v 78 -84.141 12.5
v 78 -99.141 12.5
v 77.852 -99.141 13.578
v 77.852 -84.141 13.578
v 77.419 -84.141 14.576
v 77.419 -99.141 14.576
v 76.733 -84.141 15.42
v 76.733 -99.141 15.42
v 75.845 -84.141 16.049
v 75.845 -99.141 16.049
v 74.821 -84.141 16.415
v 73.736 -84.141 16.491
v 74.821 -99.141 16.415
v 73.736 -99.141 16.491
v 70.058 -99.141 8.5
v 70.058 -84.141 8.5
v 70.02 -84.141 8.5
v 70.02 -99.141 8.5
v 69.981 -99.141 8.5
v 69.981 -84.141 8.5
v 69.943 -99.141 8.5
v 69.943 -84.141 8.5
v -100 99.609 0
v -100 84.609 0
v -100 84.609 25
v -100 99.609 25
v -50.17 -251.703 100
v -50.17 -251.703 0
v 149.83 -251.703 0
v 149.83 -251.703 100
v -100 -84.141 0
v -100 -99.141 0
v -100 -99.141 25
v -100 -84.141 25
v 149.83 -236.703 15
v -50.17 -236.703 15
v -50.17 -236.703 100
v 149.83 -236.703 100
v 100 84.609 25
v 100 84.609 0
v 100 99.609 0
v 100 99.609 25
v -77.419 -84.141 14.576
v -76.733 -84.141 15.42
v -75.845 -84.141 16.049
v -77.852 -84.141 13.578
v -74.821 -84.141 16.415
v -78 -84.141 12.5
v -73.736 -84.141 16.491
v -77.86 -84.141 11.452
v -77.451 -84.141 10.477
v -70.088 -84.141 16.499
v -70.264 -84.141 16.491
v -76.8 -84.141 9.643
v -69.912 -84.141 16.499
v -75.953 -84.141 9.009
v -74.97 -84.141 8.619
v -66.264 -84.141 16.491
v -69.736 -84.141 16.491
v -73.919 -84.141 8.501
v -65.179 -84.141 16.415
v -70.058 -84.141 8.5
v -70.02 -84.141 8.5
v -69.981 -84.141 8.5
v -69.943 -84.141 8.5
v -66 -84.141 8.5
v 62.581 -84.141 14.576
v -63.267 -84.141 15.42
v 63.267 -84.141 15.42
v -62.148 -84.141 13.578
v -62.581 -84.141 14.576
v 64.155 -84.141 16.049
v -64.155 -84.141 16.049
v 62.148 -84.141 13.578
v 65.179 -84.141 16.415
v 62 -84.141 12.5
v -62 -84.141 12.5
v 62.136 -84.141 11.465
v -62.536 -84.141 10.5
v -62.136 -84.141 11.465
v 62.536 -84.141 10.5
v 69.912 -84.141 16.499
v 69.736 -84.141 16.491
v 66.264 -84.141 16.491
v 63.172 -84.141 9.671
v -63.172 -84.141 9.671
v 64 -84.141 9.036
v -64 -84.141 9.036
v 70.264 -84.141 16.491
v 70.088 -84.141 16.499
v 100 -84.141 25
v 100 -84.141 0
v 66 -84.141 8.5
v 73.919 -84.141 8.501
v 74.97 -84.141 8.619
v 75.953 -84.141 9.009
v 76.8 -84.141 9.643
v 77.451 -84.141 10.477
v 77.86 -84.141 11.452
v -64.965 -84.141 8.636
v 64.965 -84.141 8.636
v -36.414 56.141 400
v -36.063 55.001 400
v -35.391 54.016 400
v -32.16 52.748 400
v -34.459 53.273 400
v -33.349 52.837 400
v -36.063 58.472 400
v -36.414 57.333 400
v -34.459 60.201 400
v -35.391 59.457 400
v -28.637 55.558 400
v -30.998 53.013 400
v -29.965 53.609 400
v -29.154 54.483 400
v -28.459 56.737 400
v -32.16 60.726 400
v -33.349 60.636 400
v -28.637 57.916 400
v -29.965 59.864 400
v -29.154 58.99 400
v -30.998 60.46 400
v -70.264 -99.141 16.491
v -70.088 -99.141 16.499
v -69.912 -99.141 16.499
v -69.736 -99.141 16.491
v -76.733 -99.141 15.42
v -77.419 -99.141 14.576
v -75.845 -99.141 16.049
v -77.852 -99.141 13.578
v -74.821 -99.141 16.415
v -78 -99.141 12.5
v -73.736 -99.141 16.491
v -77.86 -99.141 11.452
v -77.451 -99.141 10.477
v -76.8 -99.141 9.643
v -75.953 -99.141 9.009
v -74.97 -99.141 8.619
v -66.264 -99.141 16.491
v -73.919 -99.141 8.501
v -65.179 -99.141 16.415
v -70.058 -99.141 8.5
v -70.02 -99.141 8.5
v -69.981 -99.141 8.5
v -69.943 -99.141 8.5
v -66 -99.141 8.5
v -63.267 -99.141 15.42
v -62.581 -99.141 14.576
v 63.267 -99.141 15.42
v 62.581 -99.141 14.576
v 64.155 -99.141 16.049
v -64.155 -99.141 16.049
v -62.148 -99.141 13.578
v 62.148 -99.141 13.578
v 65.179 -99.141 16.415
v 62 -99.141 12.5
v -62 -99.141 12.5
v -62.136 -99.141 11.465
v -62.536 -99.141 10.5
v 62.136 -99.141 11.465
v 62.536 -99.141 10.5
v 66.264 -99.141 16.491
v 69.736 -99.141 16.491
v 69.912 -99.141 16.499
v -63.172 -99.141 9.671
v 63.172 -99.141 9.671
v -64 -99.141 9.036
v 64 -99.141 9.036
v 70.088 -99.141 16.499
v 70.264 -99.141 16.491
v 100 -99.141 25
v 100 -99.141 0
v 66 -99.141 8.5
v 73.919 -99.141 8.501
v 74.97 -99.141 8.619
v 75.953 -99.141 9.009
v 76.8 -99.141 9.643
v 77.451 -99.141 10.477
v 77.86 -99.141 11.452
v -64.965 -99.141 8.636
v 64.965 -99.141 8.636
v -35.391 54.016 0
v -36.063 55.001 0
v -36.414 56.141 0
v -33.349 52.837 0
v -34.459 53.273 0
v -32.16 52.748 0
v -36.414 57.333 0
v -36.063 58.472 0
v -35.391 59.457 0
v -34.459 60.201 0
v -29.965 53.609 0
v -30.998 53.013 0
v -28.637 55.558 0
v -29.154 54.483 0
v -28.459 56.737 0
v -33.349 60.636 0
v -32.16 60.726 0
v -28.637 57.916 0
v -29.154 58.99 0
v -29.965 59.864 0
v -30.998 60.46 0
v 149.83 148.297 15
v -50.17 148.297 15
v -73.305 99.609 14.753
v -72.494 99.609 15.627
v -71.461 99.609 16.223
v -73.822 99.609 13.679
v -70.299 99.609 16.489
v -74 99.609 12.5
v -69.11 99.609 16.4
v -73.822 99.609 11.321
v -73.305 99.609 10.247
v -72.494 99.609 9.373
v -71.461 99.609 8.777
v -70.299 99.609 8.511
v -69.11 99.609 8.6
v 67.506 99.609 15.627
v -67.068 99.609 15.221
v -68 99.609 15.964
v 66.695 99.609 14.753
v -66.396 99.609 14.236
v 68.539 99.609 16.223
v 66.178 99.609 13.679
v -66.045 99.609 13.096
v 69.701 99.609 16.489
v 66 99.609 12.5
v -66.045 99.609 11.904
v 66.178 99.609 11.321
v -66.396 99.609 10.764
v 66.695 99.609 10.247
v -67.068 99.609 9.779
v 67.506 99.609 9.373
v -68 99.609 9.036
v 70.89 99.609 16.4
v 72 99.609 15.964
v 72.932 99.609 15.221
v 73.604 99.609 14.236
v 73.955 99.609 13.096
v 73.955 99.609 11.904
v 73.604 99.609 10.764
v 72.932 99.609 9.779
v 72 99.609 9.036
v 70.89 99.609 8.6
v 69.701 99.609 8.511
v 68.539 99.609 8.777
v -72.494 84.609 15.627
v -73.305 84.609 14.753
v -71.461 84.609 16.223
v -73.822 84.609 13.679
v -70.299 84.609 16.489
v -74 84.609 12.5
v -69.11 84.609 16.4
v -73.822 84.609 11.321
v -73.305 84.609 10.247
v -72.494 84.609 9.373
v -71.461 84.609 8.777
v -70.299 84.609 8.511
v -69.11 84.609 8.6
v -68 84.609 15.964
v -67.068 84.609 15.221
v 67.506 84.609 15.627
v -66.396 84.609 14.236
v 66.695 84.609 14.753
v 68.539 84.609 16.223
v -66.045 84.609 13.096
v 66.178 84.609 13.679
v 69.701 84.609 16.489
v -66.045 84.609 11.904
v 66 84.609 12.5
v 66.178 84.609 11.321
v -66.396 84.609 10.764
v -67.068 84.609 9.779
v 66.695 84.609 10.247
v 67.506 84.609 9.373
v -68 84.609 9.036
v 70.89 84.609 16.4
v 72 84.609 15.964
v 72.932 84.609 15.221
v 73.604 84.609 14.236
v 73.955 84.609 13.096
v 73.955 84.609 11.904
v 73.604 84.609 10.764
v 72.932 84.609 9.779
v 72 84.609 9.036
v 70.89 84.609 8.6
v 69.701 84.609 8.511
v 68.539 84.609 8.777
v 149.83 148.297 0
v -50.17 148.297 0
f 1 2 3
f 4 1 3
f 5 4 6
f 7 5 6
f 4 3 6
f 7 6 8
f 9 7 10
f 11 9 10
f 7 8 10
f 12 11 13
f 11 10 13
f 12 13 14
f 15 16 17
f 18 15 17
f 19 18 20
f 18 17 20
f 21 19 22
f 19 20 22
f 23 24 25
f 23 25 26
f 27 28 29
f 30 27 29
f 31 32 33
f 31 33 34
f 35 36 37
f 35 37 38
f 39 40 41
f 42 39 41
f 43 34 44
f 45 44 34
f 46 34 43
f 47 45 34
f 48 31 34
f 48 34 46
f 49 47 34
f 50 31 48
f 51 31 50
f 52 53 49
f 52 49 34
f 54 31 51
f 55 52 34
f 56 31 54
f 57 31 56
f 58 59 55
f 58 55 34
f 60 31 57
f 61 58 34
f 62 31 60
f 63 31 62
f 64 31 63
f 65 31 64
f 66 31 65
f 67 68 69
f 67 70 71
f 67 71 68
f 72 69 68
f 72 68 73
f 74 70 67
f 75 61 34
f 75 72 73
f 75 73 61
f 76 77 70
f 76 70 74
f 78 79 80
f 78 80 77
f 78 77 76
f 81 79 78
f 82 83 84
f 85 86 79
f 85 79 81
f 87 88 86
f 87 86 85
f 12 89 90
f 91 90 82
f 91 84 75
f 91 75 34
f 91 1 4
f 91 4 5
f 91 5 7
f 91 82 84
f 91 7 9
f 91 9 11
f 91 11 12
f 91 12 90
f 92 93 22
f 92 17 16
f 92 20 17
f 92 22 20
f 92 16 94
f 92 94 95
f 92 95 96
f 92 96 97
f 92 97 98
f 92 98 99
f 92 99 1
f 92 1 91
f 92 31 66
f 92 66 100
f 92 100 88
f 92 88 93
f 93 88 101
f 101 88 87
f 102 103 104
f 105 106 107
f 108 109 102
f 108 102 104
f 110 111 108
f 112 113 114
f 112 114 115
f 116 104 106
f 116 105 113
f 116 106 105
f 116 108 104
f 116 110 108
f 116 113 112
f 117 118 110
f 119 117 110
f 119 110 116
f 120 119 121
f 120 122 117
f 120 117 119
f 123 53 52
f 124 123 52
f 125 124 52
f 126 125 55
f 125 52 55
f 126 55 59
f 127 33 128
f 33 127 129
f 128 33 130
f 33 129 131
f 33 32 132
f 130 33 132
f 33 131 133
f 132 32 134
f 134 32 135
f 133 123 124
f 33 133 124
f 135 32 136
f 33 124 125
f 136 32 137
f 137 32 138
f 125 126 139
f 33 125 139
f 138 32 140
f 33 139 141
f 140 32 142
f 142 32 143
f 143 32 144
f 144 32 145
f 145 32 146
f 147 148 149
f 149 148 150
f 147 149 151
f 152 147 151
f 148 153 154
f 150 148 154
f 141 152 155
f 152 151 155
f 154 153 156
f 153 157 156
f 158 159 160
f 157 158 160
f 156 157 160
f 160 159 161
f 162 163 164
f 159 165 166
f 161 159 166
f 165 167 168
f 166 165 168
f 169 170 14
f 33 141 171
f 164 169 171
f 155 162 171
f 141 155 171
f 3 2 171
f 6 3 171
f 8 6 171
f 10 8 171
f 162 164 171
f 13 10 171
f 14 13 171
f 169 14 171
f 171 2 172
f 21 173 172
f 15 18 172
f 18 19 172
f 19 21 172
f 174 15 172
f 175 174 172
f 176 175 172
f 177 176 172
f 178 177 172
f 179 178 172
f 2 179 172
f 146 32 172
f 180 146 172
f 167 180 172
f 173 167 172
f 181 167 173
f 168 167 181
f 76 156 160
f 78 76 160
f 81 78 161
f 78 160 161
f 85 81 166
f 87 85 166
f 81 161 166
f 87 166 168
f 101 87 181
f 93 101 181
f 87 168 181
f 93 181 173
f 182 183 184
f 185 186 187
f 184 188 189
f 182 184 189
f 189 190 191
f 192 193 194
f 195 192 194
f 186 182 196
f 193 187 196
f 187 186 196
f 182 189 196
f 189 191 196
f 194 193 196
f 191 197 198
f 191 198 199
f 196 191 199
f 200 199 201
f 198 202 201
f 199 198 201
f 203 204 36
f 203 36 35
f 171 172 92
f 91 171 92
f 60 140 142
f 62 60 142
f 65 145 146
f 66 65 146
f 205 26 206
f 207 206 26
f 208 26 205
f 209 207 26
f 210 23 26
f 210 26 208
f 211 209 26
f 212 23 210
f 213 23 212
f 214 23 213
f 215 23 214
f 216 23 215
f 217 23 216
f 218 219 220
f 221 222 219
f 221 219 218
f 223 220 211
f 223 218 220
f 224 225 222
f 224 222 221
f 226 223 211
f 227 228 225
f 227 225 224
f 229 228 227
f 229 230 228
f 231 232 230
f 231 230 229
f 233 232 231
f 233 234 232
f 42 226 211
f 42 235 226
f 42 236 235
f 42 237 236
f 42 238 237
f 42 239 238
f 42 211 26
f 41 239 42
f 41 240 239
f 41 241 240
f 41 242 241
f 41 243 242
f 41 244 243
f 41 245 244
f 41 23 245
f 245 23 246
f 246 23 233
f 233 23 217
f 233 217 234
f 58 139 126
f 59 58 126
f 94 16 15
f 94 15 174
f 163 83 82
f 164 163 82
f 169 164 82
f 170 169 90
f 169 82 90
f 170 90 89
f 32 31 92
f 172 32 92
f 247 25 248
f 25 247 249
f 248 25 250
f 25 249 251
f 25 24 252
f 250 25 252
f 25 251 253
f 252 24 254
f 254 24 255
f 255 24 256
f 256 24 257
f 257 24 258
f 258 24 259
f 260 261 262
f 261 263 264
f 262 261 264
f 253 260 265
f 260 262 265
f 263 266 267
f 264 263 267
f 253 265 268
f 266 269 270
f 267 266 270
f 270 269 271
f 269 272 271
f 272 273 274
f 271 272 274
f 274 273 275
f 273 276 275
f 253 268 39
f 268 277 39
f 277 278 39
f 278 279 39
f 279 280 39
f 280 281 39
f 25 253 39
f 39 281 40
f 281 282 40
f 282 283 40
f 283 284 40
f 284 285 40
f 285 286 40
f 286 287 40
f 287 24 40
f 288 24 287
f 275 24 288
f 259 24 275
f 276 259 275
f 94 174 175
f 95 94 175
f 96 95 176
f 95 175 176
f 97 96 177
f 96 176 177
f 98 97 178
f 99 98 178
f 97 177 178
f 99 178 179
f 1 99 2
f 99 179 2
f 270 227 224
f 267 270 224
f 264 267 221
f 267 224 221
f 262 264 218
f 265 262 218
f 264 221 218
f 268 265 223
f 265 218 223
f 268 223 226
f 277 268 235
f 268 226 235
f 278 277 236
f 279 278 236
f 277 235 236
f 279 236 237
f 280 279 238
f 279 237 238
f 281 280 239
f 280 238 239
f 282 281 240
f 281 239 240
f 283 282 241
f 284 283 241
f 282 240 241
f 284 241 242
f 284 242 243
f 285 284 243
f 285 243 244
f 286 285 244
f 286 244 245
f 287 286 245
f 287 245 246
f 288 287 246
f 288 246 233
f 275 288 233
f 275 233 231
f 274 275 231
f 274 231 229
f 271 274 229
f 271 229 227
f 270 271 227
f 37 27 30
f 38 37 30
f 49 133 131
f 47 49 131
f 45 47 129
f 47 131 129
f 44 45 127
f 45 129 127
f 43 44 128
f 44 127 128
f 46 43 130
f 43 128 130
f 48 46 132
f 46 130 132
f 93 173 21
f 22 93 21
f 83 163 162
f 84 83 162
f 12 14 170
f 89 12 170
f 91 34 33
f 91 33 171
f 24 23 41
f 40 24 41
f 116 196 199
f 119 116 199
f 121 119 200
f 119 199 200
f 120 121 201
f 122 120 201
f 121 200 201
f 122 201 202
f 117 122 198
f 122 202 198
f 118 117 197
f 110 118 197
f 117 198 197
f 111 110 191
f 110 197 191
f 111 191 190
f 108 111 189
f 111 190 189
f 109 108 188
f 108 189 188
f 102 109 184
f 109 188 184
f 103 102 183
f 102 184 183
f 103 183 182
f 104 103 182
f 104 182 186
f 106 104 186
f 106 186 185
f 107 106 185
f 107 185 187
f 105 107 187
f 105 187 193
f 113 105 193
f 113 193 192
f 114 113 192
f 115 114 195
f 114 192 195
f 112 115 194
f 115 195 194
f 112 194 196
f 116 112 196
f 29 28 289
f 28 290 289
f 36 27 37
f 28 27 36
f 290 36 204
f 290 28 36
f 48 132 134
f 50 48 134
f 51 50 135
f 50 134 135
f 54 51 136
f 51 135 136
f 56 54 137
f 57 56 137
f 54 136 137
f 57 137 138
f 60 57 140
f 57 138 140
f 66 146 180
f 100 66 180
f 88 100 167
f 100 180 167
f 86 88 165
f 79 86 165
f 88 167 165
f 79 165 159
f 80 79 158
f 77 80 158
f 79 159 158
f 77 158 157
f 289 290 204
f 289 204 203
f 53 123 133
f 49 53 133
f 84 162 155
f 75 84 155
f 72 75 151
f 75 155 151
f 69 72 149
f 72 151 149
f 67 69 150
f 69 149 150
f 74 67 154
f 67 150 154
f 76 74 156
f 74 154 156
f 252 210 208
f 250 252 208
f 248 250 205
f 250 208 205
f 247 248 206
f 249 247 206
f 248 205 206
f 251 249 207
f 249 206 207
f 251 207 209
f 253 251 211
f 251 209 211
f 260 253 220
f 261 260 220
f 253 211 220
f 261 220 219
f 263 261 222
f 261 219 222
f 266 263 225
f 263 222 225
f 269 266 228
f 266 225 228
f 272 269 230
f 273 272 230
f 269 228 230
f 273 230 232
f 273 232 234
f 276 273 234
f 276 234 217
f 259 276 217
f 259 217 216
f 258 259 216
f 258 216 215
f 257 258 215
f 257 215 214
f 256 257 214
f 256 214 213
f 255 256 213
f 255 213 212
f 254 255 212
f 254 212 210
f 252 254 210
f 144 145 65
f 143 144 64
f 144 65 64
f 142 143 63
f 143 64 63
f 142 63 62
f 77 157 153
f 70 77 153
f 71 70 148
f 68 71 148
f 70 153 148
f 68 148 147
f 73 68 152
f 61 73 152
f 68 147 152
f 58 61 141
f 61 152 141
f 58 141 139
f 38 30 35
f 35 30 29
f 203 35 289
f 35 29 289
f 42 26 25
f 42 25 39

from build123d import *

# Parameters (mm, degrees)
F0_W      = 200
F0_H      = 15
F1_DEPTH  = 25
F2_R      = 4
F3_DEPTH  = 400
F4_R      = 4
F5_DEPTH  = 400
F7_DEPTH  = 25
F8_W      = 200
F8_H      = 400
F9_DEPTH  = 15
F12_DEPTH = 100


with BuildPart() as f1:
    # F0 (on Top) → F1 (new body)
    with BuildSketch(Plane.XY):
        with Locations((0, 92.1094161626)):
            Rectangle(F0_W, F0_H)
    extrude(amount=F1_DEPTH)


with BuildPart() as f1b:
    # F0 (on Top) → F1, piece 2 (new body)
    with BuildSketch(Plane.XY):
        with Locations((0, -91.6406753098)):
            Rectangle(F0_W, F0_H)
    extrude(amount=F1_DEPTH)


with BuildPart() as f3_tool:
    # F2 (on face) → F3 (new body)
    with BuildSketch(Plane(origin=(0, 99.6094161626, 0), x_dir=(-1, 0, 0), z_dir=(0, 1, 0))):
        with Locations((-70, 12.5)):
            Circle(F2_R)
        with Locations((70, 12.5)):
            Circle(F2_R)
    extrude(amount=-F3_DEPTH)


with BuildPart() as f1_1:
    add(f1.part)

    # F3: cut by f3_tool
    add(f3_tool.part, mode=Mode.SUBTRACT)


with BuildPart() as f1b_1:
    add(f1b.part)

    # F3: cut by f3_tool
    add(f3_tool.part, mode=Mode.SUBTRACT)

    # F6 (on face) → F7 (cut)
    with BuildSketch(Plane.XZ.offset(99.1406753098)):
        with BuildLine():
            ThreePointArc((-66.2642582634, 16.4912614009), (-68.9203623965, 15.2334014475), (-70, 12.5))
            Line((-70, 12.5), (-62, 12.5))
            ThreePointArc((-62, 12.5), (-63.2665985525, 15.4203623965), (-66.2642582634, 16.4912614009))
        make_face()
        with BuildLine():
            ThreePointArc((-73.9189131124, 8.5008219699), (-71.1430481672, 9.700388201), (-70, 12.5))
            Line((-70, 12.5), (-78, 12.5))
            ThreePointArc((-78, 12.5), (-76.799611799, 9.6430481672), (-73.9189131124, 8.5008219699))
        make_face()
        with BuildLine():
            Line((-78, 12.5), (-70, 12.5))
            ThreePointArc((-70, 12.5), (-71.0796376035, 15.2334014475), (-73.7357417366, 16.4912614009))
            ThreePointArc((-73.7357417366, 16.4912614009), (-76.7334014475, 15.4203623965), (-78, 12.5))
        make_face()
        with BuildLine():
            ThreePointArc((-66.0004152042, 8.5000000215), (-68.8285739178, 9.6717196759), (-70, 12.5))
            ThreePointArc((-70, 12.5), (-71.1430481672, 9.700388201), (-73.9189131124, 8.5008219699))
            Line((-73.9189131124, 8.5008219699), (-66.0004152042, 8.5000000215))
        make_face()
        with BuildLine():
            ThreePointArc((-73.7357417366, 16.4912614009), (-71.0796376035, 15.2334014475), (-70, 12.5))
            ThreePointArc((-70, 12.5), (-68.9203623965, 15.2334014475), (-66.2642582634, 16.4912614009))
            Line((-66.2642582634, 16.4912614009), (-73.7357417366, 16.4912614009))
        make_face()
        with BuildLine():
            Line((-62, 12.5), (-70, 12.5))
            ThreePointArc((-70, 12.5), (-68.8285739178, 9.6717196759), (-66.0004152042, 8.5000000215))
            ThreePointArc((-66.0004152042, 8.5000000215), (-63.1717196759, 9.6714260822), (-62, 12.5))
        make_face()
        with BuildLine():
            ThreePointArc((66.2642582634, 16.4912614009), (63.2665985525, 15.4203623965), (62, 12.5))
            Line((62, 12.5), (70, 12.5))
            ThreePointArc((70, 12.5), (68.9203623965, 15.2334014475), (66.2642582634, 16.4912614009))
        make_face()
        with BuildLine():
            Line((70, 12.5), (62, 12.5))
            ThreePointArc((62, 12.5), (63.1717196759, 9.6714260822), (66.0004152042, 8.5000000215))
            ThreePointArc((66.0004152042, 8.5000000215), (68.8285739178, 9.6717196759), (70, 12.5))
        make_face()
        with BuildLine():
            ThreePointArc((73.7357417366, 16.4912614009), (71.0796376035, 15.2334014475), (70, 12.5))
            Line((70, 12.5), (78, 12.5))
            ThreePointArc((78, 12.5), (76.7334014475, 15.4203623965), (73.7357417366, 16.4912614009))
        make_face()
        with BuildLine():
            ThreePointArc((66.2642582634, 16.4912614009), (68.9203623965, 15.2334014475), (70, 12.5))
            ThreePointArc((70, 12.5), (71.0796376035, 15.2334014475), (73.7357417366, 16.4912614009))
            Line((73.7357417366, 16.4912614009), (66.2642582634, 16.4912614009))
        make_face()
        with BuildLine():
            Line((78, 12.5), (70, 12.5))
            ThreePointArc((70, 12.5), (71.1430481672, 9.700388201), (73.9189131124, 8.5008219699))
            ThreePointArc((73.9189131124, 8.5008219699), (76.799611799, 9.6430481672), (78, 12.5))
        make_face()
        with BuildLine():
            ThreePointArc((73.9189131124, 8.5008219699), (71.1430481672, 9.700388201), (70, 12.5))
            ThreePointArc((70, 12.5), (68.8285739178, 9.6717196759), (66.0004152042, 8.5000000215))
            Line((66.0004152042, 8.5000000215), (73.9189131124, 8.5008219699))
        make_face()
    extrude(amount=-F7_DEPTH, mode=Mode.SUBTRACT)


with BuildPart() as f5:
    # F4 (on Top) → F5 (new body)
    with BuildSketch(Plane.XY):
        with Locations((-32.4589386582, 56.7367635667)):
            Circle(F4_R)
    extrude(amount=F5_DEPTH)


with BuildPart() as f9:
    # F8 (on Top) → F9 (new body)
    with BuildSketch(Plane.XY):
        with Locations((49.8296707869, -51.7029643059)):
            Rectangle(F8_W, F8_H)
    extrude(amount=F9_DEPTH)

    # F11 (on face) → F12 (join)
    with BuildSketch(Plane(origin=(0, 0, 0), x_dir=(1, 0, 0), z_dir=(0, 0, -1))):
        Polygon((49.8296707869, 251.7029643059), (-50.1703292131, 251.7029643059), (-50.1703292131, 236.7029643059), (149.8296707869, 236.7029643059), (149.8296707869, 251.7029643059), align=None)
    extrude(amount=-F12_DEPTH)


solid = Compound([f1_1.part, f1b_1.part, f5.part, f9.part])
